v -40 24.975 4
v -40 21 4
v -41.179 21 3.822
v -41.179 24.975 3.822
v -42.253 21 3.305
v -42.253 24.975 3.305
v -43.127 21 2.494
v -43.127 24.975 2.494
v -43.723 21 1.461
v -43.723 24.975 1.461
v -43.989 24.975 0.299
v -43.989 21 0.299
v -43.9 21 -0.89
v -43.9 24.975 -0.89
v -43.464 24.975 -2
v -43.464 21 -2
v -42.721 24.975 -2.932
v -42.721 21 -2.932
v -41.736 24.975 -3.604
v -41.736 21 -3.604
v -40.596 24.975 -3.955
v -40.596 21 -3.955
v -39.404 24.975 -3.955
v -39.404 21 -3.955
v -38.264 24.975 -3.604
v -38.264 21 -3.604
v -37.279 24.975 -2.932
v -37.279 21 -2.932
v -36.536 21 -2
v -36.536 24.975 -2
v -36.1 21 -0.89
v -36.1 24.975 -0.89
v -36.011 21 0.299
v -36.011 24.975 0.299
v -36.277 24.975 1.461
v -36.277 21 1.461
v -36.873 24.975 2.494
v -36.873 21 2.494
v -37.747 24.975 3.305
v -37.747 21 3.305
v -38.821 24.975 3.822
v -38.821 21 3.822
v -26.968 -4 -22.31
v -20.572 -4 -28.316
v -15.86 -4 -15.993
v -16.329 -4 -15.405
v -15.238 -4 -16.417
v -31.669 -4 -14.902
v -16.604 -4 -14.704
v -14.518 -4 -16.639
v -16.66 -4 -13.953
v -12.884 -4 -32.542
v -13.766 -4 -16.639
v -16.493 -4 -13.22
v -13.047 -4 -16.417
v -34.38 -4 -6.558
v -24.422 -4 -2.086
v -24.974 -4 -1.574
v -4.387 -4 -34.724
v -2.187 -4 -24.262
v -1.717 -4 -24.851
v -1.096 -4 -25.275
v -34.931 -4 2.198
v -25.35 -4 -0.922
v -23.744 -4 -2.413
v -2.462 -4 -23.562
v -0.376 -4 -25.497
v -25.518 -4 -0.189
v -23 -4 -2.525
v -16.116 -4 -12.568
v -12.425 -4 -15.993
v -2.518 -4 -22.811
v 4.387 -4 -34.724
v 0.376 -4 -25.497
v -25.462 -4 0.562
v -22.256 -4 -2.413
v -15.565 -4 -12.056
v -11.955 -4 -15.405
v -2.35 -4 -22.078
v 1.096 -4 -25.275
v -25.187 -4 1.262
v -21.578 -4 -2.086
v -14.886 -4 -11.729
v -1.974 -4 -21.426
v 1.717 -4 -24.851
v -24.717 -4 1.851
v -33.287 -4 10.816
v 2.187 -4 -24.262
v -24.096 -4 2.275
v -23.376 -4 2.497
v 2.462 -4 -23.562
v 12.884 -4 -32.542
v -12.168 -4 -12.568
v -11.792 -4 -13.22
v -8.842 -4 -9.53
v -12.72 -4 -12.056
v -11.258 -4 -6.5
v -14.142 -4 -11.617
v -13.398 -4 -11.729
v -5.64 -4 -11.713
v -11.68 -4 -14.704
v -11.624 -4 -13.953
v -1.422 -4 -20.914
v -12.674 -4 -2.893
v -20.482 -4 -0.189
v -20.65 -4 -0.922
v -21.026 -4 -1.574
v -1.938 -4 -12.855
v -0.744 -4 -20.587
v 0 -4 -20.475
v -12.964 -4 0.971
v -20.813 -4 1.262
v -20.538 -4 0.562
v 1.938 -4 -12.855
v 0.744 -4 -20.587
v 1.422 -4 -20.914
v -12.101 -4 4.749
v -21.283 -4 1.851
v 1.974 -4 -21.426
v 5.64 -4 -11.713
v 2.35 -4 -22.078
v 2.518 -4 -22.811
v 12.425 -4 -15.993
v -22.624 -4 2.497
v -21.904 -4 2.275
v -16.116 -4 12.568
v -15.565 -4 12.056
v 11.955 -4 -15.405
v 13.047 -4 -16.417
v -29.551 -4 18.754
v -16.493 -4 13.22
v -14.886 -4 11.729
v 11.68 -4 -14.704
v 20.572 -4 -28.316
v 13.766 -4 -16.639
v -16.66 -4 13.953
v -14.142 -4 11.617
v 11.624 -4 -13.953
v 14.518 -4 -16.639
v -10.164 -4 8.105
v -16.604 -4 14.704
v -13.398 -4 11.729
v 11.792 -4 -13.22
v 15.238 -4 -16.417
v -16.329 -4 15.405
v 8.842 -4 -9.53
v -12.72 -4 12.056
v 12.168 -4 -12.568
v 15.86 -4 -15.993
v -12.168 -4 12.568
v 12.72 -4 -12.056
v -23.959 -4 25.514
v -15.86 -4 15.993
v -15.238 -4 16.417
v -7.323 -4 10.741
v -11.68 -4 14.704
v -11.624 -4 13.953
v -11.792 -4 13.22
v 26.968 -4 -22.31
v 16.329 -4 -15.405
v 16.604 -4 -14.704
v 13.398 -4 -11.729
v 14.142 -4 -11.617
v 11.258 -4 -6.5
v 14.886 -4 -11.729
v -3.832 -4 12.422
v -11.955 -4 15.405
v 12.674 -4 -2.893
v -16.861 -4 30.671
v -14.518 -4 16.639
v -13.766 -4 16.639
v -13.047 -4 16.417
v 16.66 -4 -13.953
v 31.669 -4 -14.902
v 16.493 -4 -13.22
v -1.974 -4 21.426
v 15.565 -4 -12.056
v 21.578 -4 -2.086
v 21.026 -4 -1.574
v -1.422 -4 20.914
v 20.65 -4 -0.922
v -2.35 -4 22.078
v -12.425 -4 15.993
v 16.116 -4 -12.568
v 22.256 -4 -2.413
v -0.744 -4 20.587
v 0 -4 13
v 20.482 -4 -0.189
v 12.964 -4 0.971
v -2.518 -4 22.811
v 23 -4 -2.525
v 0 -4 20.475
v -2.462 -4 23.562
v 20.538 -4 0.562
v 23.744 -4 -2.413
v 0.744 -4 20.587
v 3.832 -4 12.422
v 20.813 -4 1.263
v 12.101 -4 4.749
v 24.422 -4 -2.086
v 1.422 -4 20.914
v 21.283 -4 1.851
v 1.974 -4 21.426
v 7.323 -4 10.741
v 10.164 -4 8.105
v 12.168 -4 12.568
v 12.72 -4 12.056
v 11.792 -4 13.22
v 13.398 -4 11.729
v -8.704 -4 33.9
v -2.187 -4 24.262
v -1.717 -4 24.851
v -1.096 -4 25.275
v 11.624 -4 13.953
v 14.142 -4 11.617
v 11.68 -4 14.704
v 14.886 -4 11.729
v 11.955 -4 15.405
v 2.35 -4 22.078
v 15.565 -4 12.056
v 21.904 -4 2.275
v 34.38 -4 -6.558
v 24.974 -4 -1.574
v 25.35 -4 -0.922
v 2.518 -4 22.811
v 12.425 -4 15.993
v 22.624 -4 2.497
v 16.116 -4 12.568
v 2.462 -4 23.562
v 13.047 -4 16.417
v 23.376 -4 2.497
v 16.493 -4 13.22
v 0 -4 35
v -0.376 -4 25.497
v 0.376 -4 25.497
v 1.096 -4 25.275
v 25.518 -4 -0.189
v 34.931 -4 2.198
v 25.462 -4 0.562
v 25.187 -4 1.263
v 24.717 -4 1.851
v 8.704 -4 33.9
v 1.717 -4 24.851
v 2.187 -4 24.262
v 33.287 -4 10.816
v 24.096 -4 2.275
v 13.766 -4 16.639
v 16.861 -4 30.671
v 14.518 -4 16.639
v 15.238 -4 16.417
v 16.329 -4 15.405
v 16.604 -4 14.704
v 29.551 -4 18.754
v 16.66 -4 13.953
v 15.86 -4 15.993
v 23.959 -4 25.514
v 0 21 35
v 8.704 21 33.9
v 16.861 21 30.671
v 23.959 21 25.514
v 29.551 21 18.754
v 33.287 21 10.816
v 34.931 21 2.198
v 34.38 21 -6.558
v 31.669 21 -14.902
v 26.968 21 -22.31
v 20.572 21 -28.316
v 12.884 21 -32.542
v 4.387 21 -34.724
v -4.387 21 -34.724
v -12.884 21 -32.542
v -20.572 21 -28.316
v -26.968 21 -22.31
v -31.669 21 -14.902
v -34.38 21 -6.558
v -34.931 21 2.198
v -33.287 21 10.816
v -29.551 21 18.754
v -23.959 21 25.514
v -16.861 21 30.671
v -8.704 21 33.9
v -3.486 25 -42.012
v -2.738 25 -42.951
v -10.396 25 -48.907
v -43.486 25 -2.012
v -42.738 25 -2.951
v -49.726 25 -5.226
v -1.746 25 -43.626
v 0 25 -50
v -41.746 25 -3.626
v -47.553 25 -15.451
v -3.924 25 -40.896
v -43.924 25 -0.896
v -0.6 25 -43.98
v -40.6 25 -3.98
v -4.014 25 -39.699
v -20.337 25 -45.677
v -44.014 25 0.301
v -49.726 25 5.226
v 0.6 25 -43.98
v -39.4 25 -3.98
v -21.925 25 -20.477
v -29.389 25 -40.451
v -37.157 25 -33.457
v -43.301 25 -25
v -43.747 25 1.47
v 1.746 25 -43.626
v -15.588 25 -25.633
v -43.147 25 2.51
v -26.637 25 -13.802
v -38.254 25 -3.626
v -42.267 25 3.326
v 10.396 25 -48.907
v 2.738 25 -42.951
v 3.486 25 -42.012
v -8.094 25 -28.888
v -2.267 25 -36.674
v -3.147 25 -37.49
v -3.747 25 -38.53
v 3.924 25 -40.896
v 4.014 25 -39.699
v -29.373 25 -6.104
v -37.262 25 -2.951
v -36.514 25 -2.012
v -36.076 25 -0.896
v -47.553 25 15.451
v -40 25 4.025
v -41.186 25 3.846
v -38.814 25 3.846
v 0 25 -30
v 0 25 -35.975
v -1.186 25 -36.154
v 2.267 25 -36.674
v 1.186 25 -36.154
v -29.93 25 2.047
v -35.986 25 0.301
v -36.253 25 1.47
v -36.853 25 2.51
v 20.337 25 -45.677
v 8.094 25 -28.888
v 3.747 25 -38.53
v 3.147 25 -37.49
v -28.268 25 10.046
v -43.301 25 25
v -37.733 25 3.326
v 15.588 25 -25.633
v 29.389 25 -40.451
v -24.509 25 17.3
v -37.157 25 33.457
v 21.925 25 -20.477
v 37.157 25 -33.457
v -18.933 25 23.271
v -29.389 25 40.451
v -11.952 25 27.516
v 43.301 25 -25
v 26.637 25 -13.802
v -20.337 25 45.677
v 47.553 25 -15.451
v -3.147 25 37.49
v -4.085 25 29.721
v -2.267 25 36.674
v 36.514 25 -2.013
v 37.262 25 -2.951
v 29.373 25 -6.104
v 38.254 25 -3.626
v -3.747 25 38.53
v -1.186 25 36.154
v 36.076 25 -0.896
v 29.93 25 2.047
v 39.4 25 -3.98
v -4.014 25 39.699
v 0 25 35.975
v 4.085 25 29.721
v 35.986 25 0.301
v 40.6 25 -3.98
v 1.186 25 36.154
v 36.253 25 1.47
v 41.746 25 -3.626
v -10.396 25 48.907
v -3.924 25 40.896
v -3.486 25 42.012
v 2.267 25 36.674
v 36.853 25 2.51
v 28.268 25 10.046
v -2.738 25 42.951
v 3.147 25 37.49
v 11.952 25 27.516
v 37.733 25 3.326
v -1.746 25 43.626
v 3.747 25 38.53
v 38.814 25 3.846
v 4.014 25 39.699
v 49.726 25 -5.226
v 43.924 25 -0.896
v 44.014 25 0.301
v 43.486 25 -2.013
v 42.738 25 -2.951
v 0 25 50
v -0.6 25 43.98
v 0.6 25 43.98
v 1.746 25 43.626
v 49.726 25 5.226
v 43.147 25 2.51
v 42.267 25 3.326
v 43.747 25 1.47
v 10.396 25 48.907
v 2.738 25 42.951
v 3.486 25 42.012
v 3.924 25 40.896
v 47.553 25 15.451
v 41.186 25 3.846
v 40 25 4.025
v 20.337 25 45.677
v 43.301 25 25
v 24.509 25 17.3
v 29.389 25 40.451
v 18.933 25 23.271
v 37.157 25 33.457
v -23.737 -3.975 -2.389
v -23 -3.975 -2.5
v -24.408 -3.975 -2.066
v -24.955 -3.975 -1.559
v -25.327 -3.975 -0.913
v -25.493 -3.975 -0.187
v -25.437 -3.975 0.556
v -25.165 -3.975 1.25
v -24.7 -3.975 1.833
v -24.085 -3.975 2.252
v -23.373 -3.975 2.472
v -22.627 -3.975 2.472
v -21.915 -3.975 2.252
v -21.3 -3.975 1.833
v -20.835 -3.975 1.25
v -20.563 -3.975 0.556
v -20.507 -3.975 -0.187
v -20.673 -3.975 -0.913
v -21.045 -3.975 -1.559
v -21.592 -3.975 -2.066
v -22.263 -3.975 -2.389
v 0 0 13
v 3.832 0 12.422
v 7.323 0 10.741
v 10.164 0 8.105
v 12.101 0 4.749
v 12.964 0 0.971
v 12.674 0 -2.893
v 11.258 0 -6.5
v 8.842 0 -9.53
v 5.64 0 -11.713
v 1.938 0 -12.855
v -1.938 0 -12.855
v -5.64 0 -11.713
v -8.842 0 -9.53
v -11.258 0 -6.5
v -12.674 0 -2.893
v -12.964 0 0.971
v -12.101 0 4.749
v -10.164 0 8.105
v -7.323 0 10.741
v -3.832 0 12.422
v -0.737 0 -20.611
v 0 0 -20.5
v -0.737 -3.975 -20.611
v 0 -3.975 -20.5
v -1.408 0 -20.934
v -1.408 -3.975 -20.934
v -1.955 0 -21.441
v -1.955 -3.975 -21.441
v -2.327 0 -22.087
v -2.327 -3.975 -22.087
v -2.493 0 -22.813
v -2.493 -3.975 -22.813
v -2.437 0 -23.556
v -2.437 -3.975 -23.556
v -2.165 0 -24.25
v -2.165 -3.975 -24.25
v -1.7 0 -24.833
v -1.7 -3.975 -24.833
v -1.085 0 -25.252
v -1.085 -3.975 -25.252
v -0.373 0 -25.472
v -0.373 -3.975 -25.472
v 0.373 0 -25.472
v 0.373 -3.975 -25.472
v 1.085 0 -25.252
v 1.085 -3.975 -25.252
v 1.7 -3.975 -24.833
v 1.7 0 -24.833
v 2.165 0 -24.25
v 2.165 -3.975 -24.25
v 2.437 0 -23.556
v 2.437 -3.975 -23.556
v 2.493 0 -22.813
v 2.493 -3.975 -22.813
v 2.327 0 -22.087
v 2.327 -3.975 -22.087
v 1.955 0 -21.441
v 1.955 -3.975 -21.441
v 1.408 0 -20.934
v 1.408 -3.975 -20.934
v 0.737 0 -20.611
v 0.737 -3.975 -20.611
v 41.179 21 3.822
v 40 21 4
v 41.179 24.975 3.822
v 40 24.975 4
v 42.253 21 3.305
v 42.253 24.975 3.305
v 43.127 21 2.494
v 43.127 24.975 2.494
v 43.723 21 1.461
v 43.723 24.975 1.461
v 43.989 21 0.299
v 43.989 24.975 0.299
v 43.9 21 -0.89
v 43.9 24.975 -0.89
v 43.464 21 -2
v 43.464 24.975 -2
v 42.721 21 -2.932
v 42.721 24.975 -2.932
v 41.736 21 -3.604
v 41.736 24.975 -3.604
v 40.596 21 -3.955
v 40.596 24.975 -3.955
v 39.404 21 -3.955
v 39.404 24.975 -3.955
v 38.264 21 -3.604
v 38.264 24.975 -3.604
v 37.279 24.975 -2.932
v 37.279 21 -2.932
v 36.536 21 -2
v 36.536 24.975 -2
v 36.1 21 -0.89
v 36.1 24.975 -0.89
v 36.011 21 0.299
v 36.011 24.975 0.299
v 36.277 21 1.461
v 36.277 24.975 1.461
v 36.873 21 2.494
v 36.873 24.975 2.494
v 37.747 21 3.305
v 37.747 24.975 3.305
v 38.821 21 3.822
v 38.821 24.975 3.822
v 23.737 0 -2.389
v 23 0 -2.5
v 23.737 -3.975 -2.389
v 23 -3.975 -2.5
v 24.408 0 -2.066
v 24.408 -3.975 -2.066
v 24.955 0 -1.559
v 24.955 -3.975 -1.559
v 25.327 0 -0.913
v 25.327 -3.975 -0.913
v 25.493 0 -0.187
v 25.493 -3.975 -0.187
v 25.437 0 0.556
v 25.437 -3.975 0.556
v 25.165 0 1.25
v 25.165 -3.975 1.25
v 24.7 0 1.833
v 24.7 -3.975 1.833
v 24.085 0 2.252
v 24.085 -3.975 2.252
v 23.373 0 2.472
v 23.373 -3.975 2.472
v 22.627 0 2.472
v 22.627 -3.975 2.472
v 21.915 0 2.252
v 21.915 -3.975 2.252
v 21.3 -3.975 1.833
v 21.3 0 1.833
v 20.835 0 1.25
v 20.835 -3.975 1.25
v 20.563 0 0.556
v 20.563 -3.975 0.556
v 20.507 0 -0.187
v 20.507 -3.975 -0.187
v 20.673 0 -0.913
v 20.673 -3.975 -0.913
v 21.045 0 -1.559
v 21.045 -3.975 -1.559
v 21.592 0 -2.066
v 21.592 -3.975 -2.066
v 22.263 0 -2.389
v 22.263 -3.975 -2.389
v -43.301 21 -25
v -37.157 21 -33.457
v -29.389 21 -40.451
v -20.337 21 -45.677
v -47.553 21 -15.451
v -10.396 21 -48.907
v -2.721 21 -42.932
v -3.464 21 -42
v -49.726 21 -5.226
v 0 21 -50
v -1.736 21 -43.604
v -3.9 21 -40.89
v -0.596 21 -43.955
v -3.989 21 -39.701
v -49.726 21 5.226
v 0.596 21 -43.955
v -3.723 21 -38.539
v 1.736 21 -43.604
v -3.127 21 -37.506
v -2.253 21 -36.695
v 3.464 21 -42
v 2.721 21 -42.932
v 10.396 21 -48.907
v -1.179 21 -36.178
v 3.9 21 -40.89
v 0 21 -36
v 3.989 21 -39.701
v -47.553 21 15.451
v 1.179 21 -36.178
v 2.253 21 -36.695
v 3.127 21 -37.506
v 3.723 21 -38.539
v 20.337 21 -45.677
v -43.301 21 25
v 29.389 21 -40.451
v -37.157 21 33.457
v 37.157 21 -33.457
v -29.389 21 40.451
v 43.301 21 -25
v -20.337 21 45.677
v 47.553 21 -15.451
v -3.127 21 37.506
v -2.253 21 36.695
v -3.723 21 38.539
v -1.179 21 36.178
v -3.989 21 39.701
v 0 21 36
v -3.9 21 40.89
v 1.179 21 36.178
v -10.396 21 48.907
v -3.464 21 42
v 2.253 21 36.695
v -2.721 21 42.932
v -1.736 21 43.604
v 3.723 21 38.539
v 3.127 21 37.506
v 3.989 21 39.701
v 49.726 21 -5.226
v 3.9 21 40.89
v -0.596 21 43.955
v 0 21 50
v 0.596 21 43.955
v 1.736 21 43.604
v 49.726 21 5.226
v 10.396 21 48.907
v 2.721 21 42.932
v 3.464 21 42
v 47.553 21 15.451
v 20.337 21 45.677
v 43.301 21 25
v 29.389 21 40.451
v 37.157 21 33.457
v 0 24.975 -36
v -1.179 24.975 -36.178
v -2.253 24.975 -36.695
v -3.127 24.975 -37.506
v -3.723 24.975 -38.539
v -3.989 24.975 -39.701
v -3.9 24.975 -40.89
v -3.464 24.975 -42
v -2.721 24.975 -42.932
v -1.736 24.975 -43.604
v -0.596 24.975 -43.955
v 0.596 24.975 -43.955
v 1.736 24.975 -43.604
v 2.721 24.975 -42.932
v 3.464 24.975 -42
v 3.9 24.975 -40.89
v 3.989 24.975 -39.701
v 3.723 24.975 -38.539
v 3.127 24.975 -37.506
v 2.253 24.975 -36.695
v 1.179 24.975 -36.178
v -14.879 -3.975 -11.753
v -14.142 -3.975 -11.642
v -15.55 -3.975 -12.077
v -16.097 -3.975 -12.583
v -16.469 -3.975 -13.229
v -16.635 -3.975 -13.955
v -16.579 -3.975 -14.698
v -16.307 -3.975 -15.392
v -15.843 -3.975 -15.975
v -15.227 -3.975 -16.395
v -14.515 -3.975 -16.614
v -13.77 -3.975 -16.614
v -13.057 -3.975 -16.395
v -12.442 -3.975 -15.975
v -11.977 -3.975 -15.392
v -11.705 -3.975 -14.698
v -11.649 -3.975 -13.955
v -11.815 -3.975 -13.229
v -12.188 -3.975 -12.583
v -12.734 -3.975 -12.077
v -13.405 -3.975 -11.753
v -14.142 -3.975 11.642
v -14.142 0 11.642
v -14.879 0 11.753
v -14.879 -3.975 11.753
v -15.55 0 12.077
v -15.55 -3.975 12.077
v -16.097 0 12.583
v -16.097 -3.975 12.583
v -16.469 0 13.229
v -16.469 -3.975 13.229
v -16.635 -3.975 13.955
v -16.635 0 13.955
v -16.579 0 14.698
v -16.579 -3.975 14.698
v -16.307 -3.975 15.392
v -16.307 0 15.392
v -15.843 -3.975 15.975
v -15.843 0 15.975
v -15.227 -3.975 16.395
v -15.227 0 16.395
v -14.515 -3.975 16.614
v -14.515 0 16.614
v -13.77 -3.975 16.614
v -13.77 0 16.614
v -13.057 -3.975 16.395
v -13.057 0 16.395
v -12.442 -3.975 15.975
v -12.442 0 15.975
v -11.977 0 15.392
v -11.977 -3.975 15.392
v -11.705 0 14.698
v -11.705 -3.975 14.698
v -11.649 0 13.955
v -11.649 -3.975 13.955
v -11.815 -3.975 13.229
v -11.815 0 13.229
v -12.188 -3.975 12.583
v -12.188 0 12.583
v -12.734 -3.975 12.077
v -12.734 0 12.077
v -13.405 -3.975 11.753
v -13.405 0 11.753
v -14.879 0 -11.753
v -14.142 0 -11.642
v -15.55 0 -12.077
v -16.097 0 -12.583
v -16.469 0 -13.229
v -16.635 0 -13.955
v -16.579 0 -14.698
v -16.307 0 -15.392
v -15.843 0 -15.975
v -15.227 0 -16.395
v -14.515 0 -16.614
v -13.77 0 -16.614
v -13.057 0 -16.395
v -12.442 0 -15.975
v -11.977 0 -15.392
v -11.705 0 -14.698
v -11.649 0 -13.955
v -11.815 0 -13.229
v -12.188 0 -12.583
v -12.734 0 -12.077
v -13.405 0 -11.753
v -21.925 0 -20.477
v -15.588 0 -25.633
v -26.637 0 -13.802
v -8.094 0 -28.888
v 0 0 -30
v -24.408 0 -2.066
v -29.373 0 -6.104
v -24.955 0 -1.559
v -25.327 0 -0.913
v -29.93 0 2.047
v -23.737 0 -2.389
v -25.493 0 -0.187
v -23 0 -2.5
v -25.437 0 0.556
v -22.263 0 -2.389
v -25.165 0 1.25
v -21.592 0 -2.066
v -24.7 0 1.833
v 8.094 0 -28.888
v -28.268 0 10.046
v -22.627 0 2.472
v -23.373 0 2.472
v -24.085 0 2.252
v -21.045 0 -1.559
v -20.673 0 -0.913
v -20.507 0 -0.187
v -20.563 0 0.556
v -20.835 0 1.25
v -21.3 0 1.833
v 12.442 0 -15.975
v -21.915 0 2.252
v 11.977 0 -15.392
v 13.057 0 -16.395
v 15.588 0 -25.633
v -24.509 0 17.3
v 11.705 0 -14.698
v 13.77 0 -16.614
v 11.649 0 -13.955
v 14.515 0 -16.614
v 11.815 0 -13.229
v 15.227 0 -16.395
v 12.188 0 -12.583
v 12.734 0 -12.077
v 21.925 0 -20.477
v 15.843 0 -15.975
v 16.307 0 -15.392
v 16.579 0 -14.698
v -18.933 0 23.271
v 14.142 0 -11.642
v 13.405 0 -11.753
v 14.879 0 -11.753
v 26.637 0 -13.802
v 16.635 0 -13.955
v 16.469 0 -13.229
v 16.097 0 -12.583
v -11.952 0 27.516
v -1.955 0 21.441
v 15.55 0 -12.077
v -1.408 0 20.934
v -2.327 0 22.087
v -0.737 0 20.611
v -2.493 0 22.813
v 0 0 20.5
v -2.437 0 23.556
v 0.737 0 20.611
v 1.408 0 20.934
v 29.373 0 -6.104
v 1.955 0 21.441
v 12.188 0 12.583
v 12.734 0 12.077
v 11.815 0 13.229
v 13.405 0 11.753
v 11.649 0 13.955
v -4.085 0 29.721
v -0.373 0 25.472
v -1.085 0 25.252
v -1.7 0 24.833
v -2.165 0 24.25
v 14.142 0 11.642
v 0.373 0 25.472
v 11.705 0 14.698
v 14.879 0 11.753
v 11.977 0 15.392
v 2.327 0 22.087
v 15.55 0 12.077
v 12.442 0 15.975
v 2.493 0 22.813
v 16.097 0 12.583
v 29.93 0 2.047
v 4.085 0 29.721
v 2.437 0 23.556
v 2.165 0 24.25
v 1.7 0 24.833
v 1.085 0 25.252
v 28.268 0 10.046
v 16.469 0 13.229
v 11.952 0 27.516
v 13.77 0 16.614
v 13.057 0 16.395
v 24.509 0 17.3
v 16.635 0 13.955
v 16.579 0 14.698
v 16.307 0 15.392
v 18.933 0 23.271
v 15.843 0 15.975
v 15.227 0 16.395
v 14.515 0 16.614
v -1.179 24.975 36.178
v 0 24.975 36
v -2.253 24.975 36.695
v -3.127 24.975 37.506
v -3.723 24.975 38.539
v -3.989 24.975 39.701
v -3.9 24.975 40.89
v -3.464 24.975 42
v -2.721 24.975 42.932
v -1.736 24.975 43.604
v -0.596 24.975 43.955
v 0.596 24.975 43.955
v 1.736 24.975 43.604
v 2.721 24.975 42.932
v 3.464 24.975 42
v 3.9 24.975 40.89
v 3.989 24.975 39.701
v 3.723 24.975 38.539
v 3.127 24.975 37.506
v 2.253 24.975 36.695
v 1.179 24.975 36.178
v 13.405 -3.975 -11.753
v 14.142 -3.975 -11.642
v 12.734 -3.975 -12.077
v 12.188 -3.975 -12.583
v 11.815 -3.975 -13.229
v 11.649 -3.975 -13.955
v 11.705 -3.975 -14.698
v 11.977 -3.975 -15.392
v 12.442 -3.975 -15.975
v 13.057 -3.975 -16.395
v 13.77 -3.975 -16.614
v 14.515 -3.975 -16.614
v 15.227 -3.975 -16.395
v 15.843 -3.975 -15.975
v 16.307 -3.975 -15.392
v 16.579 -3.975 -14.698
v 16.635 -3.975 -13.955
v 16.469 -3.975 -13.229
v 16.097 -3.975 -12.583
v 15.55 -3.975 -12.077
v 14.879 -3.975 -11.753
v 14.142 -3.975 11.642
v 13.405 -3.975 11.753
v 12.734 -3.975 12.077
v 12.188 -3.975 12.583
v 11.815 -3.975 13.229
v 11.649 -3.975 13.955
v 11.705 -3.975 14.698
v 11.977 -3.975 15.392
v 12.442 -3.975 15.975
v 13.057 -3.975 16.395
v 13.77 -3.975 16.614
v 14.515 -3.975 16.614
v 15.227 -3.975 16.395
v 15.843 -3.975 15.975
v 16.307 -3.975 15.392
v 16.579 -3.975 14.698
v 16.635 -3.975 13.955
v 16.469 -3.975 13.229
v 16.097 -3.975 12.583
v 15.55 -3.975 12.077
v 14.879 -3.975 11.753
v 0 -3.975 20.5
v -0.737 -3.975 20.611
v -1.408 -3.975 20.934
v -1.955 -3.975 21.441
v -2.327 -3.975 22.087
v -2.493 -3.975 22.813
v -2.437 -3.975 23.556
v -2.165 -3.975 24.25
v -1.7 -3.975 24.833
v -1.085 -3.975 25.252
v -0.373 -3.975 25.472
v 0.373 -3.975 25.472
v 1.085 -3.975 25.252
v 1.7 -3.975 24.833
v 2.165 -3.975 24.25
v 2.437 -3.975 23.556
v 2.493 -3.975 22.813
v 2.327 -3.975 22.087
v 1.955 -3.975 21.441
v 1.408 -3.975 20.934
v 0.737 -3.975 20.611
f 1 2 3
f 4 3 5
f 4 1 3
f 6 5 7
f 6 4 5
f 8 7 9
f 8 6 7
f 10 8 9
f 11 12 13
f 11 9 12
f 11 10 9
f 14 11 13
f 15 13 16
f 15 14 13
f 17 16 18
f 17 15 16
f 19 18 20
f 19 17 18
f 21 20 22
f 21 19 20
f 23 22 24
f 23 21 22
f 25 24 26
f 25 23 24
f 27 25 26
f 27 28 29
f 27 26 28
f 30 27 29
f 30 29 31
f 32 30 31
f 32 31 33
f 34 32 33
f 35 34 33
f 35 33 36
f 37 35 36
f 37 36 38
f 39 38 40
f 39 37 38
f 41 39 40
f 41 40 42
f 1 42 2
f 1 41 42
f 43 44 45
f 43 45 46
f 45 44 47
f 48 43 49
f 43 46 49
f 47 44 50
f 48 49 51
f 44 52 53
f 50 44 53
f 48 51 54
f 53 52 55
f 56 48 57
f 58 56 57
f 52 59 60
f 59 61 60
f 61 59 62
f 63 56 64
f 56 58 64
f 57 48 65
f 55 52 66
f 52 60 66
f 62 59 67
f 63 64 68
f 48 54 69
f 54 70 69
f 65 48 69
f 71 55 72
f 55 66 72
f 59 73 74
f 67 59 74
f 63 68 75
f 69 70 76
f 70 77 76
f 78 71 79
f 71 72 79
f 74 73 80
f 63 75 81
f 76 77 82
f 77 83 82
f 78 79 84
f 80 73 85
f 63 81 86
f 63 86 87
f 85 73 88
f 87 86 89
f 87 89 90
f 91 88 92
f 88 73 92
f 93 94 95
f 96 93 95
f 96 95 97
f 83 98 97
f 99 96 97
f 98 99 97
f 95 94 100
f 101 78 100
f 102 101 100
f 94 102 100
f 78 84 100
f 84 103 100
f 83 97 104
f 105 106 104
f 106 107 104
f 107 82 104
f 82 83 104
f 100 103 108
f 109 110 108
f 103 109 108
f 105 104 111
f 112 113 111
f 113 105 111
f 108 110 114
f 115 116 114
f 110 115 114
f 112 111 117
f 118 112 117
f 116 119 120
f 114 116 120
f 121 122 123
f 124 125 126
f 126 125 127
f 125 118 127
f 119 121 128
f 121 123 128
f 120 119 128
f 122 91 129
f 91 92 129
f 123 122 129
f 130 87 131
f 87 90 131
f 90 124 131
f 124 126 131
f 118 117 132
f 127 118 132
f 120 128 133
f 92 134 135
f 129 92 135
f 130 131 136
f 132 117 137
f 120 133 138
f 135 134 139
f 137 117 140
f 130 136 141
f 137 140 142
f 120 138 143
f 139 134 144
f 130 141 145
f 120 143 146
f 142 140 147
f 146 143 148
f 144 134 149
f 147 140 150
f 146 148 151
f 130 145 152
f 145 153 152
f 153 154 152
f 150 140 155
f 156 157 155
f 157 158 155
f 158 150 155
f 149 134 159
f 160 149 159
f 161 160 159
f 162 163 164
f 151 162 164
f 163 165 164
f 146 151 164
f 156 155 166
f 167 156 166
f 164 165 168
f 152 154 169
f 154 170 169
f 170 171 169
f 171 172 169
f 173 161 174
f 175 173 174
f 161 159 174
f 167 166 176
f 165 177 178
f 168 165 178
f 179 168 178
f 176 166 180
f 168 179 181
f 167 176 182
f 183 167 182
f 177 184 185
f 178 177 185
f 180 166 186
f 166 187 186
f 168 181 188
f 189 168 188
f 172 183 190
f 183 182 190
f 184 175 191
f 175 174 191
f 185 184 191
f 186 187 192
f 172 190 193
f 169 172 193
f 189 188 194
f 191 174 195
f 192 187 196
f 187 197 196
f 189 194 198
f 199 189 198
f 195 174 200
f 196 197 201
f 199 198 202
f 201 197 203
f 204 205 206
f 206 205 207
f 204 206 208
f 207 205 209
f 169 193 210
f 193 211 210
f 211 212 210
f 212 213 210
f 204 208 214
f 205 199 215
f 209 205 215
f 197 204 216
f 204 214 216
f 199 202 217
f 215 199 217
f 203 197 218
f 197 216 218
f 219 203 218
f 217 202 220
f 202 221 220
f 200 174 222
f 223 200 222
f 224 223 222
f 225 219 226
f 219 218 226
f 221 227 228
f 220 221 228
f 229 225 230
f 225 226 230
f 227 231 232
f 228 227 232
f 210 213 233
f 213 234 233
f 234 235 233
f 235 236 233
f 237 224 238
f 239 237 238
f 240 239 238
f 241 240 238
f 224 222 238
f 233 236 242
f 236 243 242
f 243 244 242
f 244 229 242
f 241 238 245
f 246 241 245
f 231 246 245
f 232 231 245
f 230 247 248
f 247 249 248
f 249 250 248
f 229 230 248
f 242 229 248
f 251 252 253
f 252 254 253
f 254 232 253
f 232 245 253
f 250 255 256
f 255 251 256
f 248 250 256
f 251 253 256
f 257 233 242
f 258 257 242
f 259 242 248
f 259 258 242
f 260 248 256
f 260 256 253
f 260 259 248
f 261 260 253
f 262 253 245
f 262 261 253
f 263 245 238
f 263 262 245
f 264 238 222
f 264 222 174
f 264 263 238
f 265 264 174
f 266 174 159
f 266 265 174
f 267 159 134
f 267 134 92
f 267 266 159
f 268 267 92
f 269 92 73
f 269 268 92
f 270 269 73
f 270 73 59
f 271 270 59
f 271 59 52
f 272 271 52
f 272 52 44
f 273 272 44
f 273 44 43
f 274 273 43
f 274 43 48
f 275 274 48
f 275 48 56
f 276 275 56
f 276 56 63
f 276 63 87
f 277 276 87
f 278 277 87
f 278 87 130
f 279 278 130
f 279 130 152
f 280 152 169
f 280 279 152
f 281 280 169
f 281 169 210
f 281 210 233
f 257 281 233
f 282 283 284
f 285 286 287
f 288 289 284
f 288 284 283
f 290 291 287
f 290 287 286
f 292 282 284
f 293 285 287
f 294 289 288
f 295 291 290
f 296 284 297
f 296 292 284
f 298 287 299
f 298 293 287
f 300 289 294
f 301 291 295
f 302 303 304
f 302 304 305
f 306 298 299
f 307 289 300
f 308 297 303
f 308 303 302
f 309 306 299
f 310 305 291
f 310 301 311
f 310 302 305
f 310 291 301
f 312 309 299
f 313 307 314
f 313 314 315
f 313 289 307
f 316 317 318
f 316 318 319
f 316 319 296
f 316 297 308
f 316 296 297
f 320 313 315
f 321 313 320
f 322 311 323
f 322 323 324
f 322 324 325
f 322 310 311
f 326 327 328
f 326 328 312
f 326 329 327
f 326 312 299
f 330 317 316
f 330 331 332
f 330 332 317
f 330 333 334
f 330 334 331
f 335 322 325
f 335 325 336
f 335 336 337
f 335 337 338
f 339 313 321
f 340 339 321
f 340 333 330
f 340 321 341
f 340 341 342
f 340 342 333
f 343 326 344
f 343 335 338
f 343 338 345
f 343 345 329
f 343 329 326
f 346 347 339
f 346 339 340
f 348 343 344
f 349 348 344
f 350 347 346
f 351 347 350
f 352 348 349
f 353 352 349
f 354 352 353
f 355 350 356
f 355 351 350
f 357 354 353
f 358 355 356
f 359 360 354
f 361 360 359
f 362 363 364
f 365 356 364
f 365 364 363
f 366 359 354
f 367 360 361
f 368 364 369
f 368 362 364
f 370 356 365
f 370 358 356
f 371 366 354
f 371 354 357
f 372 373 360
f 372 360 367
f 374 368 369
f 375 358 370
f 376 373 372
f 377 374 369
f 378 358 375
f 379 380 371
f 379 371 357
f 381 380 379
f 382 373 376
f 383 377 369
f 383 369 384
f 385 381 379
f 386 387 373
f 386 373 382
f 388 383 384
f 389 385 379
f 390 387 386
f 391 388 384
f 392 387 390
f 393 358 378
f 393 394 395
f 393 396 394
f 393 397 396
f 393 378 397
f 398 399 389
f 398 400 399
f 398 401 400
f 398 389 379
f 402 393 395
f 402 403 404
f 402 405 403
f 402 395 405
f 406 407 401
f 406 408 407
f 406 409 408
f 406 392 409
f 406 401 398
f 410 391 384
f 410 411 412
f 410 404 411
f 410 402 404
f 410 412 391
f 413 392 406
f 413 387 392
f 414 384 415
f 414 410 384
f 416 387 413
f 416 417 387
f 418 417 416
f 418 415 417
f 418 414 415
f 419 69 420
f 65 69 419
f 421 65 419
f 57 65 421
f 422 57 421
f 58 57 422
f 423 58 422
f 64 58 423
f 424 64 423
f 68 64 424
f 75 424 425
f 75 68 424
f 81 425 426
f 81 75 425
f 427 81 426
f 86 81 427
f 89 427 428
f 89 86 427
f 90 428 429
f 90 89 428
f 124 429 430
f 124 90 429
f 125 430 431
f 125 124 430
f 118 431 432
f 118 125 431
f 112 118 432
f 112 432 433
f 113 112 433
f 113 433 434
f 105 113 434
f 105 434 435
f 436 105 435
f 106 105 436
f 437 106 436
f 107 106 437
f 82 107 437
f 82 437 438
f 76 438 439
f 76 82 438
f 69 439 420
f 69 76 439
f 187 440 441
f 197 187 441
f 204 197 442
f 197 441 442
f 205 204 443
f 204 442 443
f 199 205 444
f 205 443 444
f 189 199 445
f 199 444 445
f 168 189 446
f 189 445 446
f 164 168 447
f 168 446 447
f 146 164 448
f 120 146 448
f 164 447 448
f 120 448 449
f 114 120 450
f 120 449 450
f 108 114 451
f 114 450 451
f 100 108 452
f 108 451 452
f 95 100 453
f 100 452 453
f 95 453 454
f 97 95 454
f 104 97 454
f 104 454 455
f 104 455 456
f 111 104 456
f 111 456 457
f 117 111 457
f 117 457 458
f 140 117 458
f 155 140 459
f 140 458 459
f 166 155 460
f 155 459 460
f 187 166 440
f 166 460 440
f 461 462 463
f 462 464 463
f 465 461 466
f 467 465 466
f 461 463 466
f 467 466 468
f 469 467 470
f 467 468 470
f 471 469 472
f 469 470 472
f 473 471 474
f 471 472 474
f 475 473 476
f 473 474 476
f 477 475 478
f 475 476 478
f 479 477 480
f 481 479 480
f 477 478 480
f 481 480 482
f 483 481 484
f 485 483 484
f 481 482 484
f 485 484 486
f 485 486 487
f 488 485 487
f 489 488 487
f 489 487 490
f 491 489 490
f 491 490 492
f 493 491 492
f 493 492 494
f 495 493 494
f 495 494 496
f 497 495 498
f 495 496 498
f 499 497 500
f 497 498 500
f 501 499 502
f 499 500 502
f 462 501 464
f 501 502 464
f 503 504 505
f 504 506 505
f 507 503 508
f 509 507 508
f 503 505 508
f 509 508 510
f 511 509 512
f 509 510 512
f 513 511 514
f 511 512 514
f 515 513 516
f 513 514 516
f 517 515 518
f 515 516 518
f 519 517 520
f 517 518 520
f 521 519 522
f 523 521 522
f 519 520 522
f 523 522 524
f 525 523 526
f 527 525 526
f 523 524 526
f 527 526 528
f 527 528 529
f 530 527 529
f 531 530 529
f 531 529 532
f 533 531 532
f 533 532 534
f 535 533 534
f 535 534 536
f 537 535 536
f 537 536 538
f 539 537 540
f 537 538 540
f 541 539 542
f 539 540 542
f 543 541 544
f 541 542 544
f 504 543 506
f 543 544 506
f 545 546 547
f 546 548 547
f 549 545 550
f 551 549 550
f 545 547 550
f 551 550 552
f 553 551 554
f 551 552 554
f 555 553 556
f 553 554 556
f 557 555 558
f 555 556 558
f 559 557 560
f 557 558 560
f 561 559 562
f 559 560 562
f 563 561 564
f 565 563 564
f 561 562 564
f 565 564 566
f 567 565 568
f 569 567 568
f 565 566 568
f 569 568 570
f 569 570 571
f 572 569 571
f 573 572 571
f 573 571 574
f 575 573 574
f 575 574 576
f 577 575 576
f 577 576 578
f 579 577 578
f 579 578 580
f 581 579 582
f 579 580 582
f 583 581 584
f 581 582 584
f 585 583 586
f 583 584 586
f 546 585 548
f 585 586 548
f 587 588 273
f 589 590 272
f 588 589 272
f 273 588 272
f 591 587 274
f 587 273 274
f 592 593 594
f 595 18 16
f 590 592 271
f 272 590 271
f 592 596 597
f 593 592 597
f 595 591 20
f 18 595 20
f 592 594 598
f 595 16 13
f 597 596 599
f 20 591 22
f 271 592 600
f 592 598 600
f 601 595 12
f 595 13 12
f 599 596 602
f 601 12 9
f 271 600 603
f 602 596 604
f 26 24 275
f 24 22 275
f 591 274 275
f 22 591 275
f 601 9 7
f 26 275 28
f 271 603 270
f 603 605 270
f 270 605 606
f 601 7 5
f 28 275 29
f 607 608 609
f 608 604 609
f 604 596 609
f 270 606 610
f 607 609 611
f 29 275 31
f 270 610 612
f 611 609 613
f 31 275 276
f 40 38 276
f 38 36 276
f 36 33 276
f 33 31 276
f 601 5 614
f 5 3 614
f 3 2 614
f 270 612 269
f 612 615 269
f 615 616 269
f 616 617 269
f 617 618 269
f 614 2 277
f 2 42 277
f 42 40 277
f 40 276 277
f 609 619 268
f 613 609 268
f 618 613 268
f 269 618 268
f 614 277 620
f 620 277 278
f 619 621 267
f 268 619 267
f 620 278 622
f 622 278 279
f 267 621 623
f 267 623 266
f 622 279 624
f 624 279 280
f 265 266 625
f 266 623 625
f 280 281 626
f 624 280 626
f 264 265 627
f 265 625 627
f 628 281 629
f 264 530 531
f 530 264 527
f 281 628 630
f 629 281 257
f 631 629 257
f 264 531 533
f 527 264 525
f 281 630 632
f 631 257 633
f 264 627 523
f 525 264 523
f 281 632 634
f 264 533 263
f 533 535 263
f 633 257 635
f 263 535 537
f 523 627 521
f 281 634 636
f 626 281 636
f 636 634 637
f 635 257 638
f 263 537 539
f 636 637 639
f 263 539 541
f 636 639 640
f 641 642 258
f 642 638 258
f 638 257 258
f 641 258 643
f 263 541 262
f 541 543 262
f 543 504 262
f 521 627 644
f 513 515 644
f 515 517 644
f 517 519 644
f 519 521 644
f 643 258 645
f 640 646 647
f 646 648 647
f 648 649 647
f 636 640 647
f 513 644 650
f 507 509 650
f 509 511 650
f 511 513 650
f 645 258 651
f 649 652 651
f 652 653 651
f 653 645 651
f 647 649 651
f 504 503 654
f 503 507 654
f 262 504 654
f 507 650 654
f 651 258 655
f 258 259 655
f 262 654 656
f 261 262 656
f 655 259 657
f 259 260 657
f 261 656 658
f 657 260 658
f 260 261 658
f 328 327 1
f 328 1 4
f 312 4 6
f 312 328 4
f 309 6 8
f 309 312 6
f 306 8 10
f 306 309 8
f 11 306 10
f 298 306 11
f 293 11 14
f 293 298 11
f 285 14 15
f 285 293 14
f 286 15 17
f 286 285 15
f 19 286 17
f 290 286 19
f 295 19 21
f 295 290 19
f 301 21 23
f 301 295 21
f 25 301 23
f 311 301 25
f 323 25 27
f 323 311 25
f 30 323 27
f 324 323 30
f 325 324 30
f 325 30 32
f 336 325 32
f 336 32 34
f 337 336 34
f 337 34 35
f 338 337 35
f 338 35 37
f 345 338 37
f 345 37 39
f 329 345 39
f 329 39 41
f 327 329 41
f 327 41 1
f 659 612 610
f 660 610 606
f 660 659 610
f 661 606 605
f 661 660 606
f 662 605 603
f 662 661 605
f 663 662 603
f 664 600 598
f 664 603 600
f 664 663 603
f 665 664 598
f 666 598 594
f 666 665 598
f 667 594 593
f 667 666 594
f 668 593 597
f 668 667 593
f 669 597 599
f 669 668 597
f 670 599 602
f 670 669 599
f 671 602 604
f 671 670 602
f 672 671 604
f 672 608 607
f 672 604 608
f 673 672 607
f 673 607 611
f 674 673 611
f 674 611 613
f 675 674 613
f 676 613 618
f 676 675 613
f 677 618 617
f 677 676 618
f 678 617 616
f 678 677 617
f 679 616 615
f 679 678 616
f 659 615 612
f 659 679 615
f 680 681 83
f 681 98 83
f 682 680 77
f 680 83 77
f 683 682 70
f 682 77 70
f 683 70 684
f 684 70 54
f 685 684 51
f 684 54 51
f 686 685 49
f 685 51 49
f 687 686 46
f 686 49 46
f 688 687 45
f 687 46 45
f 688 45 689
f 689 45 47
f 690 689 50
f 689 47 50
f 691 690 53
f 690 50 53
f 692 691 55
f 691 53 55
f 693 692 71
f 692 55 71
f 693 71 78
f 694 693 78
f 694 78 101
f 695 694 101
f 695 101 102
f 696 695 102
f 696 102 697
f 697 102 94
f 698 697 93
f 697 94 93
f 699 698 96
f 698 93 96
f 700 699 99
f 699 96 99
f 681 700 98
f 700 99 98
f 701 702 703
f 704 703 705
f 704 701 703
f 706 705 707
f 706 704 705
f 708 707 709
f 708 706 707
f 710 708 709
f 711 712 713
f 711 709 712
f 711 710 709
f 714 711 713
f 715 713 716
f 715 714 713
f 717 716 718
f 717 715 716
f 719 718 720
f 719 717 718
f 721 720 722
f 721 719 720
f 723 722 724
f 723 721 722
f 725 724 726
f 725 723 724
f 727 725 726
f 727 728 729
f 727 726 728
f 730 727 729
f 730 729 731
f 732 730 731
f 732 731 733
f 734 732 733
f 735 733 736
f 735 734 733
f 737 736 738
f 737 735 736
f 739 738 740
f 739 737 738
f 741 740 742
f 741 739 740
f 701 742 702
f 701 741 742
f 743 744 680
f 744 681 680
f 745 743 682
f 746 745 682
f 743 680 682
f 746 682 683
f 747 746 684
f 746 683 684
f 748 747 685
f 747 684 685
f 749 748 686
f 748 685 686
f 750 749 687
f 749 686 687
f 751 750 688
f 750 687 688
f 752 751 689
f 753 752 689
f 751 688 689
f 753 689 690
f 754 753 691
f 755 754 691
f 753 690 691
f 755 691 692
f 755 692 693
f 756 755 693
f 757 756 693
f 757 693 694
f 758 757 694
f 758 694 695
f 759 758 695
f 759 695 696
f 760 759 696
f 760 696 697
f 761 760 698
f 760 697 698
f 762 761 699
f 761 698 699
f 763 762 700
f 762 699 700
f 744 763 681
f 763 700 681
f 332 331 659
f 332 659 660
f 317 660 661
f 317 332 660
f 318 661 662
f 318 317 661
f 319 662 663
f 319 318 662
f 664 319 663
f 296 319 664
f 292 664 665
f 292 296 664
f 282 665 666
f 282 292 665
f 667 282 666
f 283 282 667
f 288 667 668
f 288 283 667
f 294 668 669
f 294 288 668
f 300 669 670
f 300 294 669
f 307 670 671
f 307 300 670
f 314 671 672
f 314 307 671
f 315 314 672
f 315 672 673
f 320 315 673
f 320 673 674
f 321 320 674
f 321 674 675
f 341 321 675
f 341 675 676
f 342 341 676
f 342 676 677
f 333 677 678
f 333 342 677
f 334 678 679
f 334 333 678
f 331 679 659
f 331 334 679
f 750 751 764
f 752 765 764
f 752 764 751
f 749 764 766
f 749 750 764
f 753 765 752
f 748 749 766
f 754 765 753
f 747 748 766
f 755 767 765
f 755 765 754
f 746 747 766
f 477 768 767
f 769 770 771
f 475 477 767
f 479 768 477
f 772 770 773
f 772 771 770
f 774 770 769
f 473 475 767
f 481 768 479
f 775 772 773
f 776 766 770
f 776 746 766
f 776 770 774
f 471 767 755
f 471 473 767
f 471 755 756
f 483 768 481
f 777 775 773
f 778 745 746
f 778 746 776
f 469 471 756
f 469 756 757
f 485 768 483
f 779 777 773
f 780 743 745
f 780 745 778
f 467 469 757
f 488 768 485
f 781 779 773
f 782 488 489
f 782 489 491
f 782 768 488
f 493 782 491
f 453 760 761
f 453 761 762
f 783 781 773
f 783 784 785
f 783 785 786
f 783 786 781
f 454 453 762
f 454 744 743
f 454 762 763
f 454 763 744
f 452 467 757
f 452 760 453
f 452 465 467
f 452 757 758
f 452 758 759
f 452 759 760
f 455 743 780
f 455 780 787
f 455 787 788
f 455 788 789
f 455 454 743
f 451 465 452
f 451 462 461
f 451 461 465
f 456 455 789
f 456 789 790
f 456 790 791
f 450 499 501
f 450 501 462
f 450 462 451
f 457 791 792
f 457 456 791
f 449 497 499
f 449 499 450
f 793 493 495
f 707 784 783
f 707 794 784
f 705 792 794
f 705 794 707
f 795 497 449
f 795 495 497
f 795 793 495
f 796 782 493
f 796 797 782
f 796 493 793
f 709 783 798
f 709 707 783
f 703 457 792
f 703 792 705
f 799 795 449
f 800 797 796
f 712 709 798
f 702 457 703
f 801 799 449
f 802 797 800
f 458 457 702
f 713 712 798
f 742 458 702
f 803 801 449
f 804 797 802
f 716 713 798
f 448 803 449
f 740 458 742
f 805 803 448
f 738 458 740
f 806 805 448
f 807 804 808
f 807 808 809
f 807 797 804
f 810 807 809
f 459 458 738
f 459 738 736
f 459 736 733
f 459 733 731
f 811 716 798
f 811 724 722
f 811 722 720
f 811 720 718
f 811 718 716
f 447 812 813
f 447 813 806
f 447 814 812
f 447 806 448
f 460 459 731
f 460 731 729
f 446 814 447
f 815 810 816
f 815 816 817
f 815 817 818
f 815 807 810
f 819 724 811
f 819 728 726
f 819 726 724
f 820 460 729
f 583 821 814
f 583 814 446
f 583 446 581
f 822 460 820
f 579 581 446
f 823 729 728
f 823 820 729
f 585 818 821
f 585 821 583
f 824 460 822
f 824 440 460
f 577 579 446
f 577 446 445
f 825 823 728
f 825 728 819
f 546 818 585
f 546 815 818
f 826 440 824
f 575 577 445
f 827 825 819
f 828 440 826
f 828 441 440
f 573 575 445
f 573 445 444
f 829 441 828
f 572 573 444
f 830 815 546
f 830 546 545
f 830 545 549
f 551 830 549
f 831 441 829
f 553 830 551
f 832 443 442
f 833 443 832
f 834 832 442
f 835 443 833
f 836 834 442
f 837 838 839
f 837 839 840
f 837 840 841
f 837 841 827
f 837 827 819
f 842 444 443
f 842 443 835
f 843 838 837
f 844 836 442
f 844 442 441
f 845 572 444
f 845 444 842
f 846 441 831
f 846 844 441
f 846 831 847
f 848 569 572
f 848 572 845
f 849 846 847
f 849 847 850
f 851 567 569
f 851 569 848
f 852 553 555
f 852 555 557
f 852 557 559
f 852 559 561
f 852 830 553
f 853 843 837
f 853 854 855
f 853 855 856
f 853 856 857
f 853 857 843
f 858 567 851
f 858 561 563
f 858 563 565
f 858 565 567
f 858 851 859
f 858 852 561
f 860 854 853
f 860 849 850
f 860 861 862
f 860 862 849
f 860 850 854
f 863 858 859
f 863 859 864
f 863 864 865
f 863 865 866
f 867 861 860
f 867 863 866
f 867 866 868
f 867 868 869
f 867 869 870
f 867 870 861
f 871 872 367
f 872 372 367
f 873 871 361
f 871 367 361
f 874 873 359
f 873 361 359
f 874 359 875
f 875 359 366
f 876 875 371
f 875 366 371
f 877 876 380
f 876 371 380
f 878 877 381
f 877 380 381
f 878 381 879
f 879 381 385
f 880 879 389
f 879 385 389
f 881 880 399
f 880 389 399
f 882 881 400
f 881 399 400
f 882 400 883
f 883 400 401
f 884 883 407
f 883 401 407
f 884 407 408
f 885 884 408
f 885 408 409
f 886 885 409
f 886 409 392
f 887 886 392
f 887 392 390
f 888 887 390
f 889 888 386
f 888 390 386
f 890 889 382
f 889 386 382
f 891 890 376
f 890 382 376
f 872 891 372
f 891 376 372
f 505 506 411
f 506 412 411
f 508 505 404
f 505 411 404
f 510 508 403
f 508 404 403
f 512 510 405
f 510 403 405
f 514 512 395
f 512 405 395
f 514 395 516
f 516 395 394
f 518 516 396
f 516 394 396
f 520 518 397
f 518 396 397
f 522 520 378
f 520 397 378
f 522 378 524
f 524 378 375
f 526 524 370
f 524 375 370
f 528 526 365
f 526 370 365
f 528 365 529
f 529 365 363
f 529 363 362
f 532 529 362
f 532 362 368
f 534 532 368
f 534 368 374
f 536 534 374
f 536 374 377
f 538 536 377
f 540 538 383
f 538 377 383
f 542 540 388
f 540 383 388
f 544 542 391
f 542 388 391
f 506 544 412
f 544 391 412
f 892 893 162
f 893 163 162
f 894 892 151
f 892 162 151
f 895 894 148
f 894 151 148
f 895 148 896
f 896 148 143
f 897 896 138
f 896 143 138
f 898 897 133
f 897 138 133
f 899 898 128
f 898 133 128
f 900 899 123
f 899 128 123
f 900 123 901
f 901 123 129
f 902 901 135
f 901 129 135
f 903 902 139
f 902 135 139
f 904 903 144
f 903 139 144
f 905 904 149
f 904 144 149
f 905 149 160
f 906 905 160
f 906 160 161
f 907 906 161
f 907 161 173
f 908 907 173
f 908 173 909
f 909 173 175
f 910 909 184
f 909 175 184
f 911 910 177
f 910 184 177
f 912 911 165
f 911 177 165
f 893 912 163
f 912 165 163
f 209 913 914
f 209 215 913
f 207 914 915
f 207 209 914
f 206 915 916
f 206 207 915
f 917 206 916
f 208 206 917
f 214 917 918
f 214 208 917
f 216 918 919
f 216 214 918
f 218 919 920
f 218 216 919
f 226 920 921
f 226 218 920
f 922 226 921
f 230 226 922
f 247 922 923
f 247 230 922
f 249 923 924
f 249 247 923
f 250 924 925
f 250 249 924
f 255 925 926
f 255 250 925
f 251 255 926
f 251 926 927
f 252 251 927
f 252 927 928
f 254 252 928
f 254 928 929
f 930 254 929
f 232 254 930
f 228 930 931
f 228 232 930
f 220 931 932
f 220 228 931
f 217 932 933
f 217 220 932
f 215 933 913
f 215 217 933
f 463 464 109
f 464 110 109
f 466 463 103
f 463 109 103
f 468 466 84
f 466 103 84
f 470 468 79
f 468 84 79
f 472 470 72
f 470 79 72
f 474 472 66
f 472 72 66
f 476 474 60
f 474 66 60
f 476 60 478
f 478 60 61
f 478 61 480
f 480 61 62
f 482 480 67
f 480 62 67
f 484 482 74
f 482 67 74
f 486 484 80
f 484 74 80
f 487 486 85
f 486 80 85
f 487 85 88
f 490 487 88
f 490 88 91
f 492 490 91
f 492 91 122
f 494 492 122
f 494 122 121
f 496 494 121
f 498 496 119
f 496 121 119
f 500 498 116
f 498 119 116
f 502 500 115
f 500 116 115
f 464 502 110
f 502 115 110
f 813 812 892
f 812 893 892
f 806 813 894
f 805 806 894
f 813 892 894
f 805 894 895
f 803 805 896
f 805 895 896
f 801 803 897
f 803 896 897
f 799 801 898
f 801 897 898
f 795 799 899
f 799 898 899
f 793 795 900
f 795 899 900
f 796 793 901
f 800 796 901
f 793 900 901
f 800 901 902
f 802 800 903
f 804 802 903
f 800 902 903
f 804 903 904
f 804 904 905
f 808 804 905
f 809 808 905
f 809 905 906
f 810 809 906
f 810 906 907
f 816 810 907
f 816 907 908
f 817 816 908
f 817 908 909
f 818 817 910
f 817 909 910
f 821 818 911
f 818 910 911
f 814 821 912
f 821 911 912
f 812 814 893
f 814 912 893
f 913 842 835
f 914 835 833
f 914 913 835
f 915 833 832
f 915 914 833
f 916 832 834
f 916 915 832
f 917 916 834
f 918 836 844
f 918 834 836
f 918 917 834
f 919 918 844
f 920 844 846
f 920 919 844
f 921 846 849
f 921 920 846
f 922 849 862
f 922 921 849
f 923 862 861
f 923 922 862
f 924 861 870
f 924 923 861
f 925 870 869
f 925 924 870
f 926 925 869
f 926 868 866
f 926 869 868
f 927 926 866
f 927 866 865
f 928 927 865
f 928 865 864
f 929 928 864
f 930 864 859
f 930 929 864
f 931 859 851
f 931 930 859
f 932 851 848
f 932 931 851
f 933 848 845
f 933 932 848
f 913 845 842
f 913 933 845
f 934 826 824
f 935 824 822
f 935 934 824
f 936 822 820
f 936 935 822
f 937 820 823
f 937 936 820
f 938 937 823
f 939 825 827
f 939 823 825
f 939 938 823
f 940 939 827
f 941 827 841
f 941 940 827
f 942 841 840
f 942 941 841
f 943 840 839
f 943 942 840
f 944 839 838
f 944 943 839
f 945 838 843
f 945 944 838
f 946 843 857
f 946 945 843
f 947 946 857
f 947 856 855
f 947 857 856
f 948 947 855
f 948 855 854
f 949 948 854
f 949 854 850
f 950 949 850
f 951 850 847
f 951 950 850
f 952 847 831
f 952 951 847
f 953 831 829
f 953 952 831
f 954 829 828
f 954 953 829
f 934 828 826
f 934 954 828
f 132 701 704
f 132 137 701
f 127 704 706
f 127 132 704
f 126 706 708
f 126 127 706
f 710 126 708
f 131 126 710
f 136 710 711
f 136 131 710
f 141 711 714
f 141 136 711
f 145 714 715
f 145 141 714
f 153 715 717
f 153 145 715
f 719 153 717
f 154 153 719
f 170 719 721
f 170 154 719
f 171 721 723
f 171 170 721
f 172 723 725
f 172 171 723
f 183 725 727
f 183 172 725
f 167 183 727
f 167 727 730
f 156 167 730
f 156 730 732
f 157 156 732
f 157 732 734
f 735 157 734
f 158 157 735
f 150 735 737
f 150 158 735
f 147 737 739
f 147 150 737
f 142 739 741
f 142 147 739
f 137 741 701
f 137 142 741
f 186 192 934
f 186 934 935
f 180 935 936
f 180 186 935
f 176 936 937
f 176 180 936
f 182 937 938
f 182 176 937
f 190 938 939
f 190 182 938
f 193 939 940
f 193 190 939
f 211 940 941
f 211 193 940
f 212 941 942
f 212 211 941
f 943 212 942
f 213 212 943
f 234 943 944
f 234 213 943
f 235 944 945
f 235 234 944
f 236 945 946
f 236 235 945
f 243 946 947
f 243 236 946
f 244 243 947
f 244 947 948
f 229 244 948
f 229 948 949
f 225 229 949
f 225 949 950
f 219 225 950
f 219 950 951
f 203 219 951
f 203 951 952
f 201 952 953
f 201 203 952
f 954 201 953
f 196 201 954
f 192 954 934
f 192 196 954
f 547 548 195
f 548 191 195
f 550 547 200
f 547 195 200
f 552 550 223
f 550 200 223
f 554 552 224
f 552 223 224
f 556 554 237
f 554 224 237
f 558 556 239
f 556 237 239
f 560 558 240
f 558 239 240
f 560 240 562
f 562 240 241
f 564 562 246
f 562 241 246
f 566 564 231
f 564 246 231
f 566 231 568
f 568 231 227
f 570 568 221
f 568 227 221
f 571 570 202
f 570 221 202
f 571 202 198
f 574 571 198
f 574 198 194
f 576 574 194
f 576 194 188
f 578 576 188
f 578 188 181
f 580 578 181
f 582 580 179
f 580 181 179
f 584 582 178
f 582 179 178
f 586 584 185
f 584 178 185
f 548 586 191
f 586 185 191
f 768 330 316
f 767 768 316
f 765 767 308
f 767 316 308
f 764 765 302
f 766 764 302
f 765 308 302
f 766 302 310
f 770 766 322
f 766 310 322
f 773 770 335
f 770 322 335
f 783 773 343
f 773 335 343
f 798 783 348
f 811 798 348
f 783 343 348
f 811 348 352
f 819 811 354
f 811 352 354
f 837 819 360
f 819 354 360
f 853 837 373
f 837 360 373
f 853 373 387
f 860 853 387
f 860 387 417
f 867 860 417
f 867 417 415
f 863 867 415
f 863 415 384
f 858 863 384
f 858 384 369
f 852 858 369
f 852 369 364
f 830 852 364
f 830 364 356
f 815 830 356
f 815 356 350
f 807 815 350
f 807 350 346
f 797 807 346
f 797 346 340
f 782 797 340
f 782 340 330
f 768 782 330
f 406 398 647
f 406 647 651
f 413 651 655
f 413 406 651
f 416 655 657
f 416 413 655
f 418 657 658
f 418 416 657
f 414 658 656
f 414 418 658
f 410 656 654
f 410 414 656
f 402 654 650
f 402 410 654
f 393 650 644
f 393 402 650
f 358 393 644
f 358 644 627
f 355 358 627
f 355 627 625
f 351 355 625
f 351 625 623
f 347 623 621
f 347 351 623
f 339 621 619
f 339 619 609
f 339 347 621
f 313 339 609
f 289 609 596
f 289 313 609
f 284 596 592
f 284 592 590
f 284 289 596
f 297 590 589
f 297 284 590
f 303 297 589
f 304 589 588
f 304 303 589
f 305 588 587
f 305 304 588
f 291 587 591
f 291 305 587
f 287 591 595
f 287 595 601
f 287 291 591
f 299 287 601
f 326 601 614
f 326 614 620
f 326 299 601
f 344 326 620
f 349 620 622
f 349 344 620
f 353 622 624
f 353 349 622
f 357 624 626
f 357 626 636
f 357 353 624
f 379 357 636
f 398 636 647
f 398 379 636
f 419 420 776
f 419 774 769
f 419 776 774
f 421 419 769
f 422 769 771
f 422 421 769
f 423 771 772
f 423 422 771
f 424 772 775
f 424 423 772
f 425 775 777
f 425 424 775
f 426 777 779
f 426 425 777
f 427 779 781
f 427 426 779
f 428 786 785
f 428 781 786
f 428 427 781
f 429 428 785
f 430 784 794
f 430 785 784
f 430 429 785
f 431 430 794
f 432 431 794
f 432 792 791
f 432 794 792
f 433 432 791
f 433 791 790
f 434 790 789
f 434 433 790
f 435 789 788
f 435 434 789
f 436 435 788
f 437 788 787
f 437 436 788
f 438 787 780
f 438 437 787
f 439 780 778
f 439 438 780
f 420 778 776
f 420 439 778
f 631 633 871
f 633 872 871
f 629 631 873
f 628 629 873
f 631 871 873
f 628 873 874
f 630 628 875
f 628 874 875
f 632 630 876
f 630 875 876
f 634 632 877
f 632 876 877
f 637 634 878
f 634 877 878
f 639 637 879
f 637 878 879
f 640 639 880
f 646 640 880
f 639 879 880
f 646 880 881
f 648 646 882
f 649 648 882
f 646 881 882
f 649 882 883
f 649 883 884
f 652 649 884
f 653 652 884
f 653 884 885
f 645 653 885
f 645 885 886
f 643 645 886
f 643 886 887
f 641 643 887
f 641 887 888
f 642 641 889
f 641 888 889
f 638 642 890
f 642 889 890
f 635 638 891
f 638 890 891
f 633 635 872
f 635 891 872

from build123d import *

# Parameters (mm, degrees)
SKETCH1_R                        = 35
SKETCH1_R_2                      = 13
BOSS_EXTRUDE1_DEPTH              = 4
F_5_0_MM_DOWEL_HOLES1_AT_2_COUNT = 2
F_5_0_MM_DOWEL_HOLES1_AT_2_PITCH = 32.526911935
F_5_0_MM_DOWEL_HOLES2_AT_2_COUNT = 2
F_5_0_MM_DOWEL_HOLES2_AT_2_PITCH = 28.284271247
BOSS_EXTRUDE2_START              = 21
SKETCH6_R                        = 35
SKETCH6_R_2                      = 30
BOSS_EXTRUDE2_DEPTH              = 21
BOSS_EXTRUDE3_START              = 4
SKETCH7_R                        = 50
SKETCH7_R_2                      = 30
BOSS_EXTRUDE3_DEPTH              = 4
F_8_0_MM_DOWEL_HOLES1_AT_2_COUNT = 2
F_8_0_MM_DOWEL_HOLES1_AT_2_PITCH = 56.568542495


with BuildPart() as part:
    # Sketch1 → Boss-Extrude1 (new body)
    with BuildSketch(Plane(origin=(0, 0, 0), x_dir=(1, 0, 0), z_dir=(0, 1, 0))):
        with Locations(Location((0, 0, 0), (0, 0, 270))):
            Circle(SKETCH1_R)
        with Locations(Location((0, 0, 0), (0, 0, 270))):
            Circle(SKETCH1_R_2, mode=Mode.SUBTRACT)
    extrude(amount=-BOSS_EXTRUDE1_DEPTH)

    # Sketch3 → Ø5.0 mm Dowel Holes1 (revolve, cut)
    with BuildSketch(Plane(origin=(0, -4, 23), x_dir=(0, 0, -1), z_dir=(1, 0, 0))):
        Polygon((0, 0), (0, 21.502151548), (2.5, 20), (2.5, 0.025), (2.525, 0), align=None)
    f_5_0_mm_dowel_holes1 = revolve(axis=Axis((0, -10.35, 23), (0, 1, 0)), mode=Mode.SUBTRACT)

    # Ø5.0 mm Dowel Holes1 at 2: Ø5.0 mm Dowel Holes1 ×2
    with Locations(*[Vector(-0.7071067811865476, 0, -0.7071067811865476) * (i * F_5_0_MM_DOWEL_HOLES1_AT_2_PITCH) for i in range(1, F_5_0_MM_DOWEL_HOLES1_AT_2_COUNT)]):
        add(f_5_0_mm_dowel_holes1, mode=Mode.SUBTRACT)

    # Mirror1: Ø5.0 mm Dowel Holes1 across plane
    add(f_5_0_mm_dowel_holes1.mirror(Plane(origin=(0, 0, 0), x_dir=(0, 0, 1), z_dir=(1, 0, 0))), mode=Mode.SUBTRACT)

    # Mirror1 copy 1 sketch → Mirror1 copy 1 (revolve, cut)
    with BuildSketch(Plane(origin=(23, -4, 0), x_dir=(0, 0, -1), z_dir=(-1, 0, 0))):
        Polygon((0, 0), (0, -21.502151548), (2.5, -20), (2.5, -0.025), (2.525, 0), align=None)
    revolve(axis=Axis((23, -10.35, 0), (0, -1, 0)), mode=Mode.SUBTRACT)

    # Mirror1 at the second plane: Ø5.0 mm Dowel Holes1 across plane
    add(f_5_0_mm_dowel_holes1.mirror(Plane.XY), mode=Mode.SUBTRACT)

    # Mirror1 at the second plane copy 1 sketc → Mirror1 at the second plane copy 1 (revolve, cut)
    with BuildSketch(Plane(origin=(-23, -4, 0), x_dir=(0, 0, 1), z_dir=(1, 0, 0))):
        Polygon((0, 0), (0, -21.502151548), (2.5, -20), (2.5, -0.025), (2.525, 0), align=None)
    revolve(axis=Axis((-23, -10.35, 0), (0, -1, 0)), mode=Mode.SUBTRACT)

    # Sketch5 → Ø5.0 mm Dowel Holes2 (revolve, cut)
    with BuildSketch(Plane(origin=(-14.142135624, -4, 14.142135624), x_dir=(0, 0, -1), z_dir=(1, 0, 0))):
        Polygon((0, 0), (0, 21.502151548), (2.5, 20), (2.5, 0.025), (2.525, 0), align=None)
    f_5_0_mm_dowel_holes2 = revolve(axis=Axis((-14.142135624, -10.35, 14.142135624), (0, 1, 0)), mode=Mode.SUBTRACT)

    # Ø5.0 mm Dowel Holes2 at 2: Ø5.0 mm Dowel Holes2 ×2
    with Locations(*[(i * F_5_0_MM_DOWEL_HOLES2_AT_2_PITCH, 0, 0) for i in range(1, F_5_0_MM_DOWEL_HOLES2_AT_2_COUNT)]):
        add(f_5_0_mm_dowel_holes2, mode=Mode.SUBTRACT)

    # Mirror2: Ø5.0 mm Dowel Holes2 across plane
    add(f_5_0_mm_dowel_holes2.mirror(Plane.XY), mode=Mode.SUBTRACT)

    # Mirror2 copy 1 sketch → Mirror2 copy 1 (revolve, cut)
    with BuildSketch(Plane(origin=(14.142135624, -4, -14.142135624), x_dir=(0, 0, 1), z_dir=(1, 0, 0))):
        Polygon((0, 0), (0, -21.502151548), (2.5, -20), (2.5, -0.025), (2.525, 0), align=None)
    revolve(axis=Axis((14.142135624, -10.35, -14.142135624), (0, -1, 0)), mode=Mode.SUBTRACT)

    # Sketch6 → Boss-Extrude2 (add)
    with BuildSketch(Plane(origin=(0, 0, 0), x_dir=(1, 0, 0), z_dir=(0, 1, 0)).offset(BOSS_EXTRUDE2_START)):
        with Locations(Location((0, 0, 0), (0, 0, 270))):
            Circle(SKETCH6_R)
        with Locations(Location((0, 0, 0), (0, 0, 90))):
            Circle(SKETCH6_R_2, mode=Mode.SUBTRACT)
    extrude(amount=-BOSS_EXTRUDE2_DEPTH)

    # Sketch7 → Boss-Extrude3 (add)
    with BuildSketch(Plane(origin=(0, 21, 0), x_dir=(1, 0, 0), z_dir=(0, 1, 0)).offset(BOSS_EXTRUDE3_START)):
        with Locations(Location((0, 0, 0), (0, 0, 270))):
            Circle(SKETCH7_R)
        with Locations(Location((0, 0, 0), (0, 0, 90))):
            Circle(SKETCH7_R_2, mode=Mode.SUBTRACT)
    extrude(amount=-BOSS_EXTRUDE3_DEPTH)

    # Sketch9 → Ø8.0 mm Dowel Holes1 (revolve, cut)
    with BuildSketch(Plane(origin=(0, 25, -40), x_dir=(0, 0, 1), z_dir=(1, 0, 0))):
        Polygon((0, 0), (0, 22.403442476), (4, 20), (4, 0.025), (4.025, 0), align=None)
    f_8_0_mm_dowel_holes1 = revolve(axis=Axis((0, 31.35, -40), (0, -1, 0)), mode=Mode.SUBTRACT)

    # Ø8.0 mm Dowel Holes1 at 2: Ø8.0 mm Dowel Holes1 ×2
    with Locations(*[Vector(-0.7071067811865476, 0, 0.7071067811865476) * (i * F_8_0_MM_DOWEL_HOLES1_AT_2_PITCH) for i in range(1, F_8_0_MM_DOWEL_HOLES1_AT_2_COUNT)]):
        add(f_8_0_mm_dowel_holes1, mode=Mode.SUBTRACT)

    # Mirror3: Ø8.0 mm Dowel Holes1 across plane
    add(f_8_0_mm_dowel_holes1.mirror(Plane(origin=(0, 0, 0), x_dir=(0, 0, 1), z_dir=(1, 0, 0))), mode=Mode.SUBTRACT)

    # Mirror3 copy 1 sketch → Mirror3 copy 1 (revolve, cut)
    with BuildSketch(Plane(origin=(40, 25, 0), x_dir=(0, 0, 1), z_dir=(-1, 0, 0))):
        Polygon((0, 0), (0, -22.403442476), (4, -20), (4, -0.025), (4.025, 0), align=None)
    revolve(axis=Axis((40, 31.35, 0), (0, 1, 0)), mode=Mode.SUBTRACT)

    # Mirror3 at the second plane: Ø8.0 mm Dowel Holes1 across plane
    add(f_8_0_mm_dowel_holes1.mirror(Plane.XY), mode=Mode.SUBTRACT)

    # Mirror3 at the second plane copy 1 sketc → Mirror3 at the second plane copy 1 (revolve, cut)
    with BuildSketch(Plane(origin=(-40, 25, 0), x_dir=(0, 0, -1), z_dir=(1, 0, 0))):
        Polygon((0, 0), (0, -22.403442476), (4, -20), (4, -0.025), (4.025, 0), align=None)
    revolve(axis=Axis((-40, 31.35, 0), (0, 1, 0)), mode=Mode.SUBTRACT)


solid = part.part
